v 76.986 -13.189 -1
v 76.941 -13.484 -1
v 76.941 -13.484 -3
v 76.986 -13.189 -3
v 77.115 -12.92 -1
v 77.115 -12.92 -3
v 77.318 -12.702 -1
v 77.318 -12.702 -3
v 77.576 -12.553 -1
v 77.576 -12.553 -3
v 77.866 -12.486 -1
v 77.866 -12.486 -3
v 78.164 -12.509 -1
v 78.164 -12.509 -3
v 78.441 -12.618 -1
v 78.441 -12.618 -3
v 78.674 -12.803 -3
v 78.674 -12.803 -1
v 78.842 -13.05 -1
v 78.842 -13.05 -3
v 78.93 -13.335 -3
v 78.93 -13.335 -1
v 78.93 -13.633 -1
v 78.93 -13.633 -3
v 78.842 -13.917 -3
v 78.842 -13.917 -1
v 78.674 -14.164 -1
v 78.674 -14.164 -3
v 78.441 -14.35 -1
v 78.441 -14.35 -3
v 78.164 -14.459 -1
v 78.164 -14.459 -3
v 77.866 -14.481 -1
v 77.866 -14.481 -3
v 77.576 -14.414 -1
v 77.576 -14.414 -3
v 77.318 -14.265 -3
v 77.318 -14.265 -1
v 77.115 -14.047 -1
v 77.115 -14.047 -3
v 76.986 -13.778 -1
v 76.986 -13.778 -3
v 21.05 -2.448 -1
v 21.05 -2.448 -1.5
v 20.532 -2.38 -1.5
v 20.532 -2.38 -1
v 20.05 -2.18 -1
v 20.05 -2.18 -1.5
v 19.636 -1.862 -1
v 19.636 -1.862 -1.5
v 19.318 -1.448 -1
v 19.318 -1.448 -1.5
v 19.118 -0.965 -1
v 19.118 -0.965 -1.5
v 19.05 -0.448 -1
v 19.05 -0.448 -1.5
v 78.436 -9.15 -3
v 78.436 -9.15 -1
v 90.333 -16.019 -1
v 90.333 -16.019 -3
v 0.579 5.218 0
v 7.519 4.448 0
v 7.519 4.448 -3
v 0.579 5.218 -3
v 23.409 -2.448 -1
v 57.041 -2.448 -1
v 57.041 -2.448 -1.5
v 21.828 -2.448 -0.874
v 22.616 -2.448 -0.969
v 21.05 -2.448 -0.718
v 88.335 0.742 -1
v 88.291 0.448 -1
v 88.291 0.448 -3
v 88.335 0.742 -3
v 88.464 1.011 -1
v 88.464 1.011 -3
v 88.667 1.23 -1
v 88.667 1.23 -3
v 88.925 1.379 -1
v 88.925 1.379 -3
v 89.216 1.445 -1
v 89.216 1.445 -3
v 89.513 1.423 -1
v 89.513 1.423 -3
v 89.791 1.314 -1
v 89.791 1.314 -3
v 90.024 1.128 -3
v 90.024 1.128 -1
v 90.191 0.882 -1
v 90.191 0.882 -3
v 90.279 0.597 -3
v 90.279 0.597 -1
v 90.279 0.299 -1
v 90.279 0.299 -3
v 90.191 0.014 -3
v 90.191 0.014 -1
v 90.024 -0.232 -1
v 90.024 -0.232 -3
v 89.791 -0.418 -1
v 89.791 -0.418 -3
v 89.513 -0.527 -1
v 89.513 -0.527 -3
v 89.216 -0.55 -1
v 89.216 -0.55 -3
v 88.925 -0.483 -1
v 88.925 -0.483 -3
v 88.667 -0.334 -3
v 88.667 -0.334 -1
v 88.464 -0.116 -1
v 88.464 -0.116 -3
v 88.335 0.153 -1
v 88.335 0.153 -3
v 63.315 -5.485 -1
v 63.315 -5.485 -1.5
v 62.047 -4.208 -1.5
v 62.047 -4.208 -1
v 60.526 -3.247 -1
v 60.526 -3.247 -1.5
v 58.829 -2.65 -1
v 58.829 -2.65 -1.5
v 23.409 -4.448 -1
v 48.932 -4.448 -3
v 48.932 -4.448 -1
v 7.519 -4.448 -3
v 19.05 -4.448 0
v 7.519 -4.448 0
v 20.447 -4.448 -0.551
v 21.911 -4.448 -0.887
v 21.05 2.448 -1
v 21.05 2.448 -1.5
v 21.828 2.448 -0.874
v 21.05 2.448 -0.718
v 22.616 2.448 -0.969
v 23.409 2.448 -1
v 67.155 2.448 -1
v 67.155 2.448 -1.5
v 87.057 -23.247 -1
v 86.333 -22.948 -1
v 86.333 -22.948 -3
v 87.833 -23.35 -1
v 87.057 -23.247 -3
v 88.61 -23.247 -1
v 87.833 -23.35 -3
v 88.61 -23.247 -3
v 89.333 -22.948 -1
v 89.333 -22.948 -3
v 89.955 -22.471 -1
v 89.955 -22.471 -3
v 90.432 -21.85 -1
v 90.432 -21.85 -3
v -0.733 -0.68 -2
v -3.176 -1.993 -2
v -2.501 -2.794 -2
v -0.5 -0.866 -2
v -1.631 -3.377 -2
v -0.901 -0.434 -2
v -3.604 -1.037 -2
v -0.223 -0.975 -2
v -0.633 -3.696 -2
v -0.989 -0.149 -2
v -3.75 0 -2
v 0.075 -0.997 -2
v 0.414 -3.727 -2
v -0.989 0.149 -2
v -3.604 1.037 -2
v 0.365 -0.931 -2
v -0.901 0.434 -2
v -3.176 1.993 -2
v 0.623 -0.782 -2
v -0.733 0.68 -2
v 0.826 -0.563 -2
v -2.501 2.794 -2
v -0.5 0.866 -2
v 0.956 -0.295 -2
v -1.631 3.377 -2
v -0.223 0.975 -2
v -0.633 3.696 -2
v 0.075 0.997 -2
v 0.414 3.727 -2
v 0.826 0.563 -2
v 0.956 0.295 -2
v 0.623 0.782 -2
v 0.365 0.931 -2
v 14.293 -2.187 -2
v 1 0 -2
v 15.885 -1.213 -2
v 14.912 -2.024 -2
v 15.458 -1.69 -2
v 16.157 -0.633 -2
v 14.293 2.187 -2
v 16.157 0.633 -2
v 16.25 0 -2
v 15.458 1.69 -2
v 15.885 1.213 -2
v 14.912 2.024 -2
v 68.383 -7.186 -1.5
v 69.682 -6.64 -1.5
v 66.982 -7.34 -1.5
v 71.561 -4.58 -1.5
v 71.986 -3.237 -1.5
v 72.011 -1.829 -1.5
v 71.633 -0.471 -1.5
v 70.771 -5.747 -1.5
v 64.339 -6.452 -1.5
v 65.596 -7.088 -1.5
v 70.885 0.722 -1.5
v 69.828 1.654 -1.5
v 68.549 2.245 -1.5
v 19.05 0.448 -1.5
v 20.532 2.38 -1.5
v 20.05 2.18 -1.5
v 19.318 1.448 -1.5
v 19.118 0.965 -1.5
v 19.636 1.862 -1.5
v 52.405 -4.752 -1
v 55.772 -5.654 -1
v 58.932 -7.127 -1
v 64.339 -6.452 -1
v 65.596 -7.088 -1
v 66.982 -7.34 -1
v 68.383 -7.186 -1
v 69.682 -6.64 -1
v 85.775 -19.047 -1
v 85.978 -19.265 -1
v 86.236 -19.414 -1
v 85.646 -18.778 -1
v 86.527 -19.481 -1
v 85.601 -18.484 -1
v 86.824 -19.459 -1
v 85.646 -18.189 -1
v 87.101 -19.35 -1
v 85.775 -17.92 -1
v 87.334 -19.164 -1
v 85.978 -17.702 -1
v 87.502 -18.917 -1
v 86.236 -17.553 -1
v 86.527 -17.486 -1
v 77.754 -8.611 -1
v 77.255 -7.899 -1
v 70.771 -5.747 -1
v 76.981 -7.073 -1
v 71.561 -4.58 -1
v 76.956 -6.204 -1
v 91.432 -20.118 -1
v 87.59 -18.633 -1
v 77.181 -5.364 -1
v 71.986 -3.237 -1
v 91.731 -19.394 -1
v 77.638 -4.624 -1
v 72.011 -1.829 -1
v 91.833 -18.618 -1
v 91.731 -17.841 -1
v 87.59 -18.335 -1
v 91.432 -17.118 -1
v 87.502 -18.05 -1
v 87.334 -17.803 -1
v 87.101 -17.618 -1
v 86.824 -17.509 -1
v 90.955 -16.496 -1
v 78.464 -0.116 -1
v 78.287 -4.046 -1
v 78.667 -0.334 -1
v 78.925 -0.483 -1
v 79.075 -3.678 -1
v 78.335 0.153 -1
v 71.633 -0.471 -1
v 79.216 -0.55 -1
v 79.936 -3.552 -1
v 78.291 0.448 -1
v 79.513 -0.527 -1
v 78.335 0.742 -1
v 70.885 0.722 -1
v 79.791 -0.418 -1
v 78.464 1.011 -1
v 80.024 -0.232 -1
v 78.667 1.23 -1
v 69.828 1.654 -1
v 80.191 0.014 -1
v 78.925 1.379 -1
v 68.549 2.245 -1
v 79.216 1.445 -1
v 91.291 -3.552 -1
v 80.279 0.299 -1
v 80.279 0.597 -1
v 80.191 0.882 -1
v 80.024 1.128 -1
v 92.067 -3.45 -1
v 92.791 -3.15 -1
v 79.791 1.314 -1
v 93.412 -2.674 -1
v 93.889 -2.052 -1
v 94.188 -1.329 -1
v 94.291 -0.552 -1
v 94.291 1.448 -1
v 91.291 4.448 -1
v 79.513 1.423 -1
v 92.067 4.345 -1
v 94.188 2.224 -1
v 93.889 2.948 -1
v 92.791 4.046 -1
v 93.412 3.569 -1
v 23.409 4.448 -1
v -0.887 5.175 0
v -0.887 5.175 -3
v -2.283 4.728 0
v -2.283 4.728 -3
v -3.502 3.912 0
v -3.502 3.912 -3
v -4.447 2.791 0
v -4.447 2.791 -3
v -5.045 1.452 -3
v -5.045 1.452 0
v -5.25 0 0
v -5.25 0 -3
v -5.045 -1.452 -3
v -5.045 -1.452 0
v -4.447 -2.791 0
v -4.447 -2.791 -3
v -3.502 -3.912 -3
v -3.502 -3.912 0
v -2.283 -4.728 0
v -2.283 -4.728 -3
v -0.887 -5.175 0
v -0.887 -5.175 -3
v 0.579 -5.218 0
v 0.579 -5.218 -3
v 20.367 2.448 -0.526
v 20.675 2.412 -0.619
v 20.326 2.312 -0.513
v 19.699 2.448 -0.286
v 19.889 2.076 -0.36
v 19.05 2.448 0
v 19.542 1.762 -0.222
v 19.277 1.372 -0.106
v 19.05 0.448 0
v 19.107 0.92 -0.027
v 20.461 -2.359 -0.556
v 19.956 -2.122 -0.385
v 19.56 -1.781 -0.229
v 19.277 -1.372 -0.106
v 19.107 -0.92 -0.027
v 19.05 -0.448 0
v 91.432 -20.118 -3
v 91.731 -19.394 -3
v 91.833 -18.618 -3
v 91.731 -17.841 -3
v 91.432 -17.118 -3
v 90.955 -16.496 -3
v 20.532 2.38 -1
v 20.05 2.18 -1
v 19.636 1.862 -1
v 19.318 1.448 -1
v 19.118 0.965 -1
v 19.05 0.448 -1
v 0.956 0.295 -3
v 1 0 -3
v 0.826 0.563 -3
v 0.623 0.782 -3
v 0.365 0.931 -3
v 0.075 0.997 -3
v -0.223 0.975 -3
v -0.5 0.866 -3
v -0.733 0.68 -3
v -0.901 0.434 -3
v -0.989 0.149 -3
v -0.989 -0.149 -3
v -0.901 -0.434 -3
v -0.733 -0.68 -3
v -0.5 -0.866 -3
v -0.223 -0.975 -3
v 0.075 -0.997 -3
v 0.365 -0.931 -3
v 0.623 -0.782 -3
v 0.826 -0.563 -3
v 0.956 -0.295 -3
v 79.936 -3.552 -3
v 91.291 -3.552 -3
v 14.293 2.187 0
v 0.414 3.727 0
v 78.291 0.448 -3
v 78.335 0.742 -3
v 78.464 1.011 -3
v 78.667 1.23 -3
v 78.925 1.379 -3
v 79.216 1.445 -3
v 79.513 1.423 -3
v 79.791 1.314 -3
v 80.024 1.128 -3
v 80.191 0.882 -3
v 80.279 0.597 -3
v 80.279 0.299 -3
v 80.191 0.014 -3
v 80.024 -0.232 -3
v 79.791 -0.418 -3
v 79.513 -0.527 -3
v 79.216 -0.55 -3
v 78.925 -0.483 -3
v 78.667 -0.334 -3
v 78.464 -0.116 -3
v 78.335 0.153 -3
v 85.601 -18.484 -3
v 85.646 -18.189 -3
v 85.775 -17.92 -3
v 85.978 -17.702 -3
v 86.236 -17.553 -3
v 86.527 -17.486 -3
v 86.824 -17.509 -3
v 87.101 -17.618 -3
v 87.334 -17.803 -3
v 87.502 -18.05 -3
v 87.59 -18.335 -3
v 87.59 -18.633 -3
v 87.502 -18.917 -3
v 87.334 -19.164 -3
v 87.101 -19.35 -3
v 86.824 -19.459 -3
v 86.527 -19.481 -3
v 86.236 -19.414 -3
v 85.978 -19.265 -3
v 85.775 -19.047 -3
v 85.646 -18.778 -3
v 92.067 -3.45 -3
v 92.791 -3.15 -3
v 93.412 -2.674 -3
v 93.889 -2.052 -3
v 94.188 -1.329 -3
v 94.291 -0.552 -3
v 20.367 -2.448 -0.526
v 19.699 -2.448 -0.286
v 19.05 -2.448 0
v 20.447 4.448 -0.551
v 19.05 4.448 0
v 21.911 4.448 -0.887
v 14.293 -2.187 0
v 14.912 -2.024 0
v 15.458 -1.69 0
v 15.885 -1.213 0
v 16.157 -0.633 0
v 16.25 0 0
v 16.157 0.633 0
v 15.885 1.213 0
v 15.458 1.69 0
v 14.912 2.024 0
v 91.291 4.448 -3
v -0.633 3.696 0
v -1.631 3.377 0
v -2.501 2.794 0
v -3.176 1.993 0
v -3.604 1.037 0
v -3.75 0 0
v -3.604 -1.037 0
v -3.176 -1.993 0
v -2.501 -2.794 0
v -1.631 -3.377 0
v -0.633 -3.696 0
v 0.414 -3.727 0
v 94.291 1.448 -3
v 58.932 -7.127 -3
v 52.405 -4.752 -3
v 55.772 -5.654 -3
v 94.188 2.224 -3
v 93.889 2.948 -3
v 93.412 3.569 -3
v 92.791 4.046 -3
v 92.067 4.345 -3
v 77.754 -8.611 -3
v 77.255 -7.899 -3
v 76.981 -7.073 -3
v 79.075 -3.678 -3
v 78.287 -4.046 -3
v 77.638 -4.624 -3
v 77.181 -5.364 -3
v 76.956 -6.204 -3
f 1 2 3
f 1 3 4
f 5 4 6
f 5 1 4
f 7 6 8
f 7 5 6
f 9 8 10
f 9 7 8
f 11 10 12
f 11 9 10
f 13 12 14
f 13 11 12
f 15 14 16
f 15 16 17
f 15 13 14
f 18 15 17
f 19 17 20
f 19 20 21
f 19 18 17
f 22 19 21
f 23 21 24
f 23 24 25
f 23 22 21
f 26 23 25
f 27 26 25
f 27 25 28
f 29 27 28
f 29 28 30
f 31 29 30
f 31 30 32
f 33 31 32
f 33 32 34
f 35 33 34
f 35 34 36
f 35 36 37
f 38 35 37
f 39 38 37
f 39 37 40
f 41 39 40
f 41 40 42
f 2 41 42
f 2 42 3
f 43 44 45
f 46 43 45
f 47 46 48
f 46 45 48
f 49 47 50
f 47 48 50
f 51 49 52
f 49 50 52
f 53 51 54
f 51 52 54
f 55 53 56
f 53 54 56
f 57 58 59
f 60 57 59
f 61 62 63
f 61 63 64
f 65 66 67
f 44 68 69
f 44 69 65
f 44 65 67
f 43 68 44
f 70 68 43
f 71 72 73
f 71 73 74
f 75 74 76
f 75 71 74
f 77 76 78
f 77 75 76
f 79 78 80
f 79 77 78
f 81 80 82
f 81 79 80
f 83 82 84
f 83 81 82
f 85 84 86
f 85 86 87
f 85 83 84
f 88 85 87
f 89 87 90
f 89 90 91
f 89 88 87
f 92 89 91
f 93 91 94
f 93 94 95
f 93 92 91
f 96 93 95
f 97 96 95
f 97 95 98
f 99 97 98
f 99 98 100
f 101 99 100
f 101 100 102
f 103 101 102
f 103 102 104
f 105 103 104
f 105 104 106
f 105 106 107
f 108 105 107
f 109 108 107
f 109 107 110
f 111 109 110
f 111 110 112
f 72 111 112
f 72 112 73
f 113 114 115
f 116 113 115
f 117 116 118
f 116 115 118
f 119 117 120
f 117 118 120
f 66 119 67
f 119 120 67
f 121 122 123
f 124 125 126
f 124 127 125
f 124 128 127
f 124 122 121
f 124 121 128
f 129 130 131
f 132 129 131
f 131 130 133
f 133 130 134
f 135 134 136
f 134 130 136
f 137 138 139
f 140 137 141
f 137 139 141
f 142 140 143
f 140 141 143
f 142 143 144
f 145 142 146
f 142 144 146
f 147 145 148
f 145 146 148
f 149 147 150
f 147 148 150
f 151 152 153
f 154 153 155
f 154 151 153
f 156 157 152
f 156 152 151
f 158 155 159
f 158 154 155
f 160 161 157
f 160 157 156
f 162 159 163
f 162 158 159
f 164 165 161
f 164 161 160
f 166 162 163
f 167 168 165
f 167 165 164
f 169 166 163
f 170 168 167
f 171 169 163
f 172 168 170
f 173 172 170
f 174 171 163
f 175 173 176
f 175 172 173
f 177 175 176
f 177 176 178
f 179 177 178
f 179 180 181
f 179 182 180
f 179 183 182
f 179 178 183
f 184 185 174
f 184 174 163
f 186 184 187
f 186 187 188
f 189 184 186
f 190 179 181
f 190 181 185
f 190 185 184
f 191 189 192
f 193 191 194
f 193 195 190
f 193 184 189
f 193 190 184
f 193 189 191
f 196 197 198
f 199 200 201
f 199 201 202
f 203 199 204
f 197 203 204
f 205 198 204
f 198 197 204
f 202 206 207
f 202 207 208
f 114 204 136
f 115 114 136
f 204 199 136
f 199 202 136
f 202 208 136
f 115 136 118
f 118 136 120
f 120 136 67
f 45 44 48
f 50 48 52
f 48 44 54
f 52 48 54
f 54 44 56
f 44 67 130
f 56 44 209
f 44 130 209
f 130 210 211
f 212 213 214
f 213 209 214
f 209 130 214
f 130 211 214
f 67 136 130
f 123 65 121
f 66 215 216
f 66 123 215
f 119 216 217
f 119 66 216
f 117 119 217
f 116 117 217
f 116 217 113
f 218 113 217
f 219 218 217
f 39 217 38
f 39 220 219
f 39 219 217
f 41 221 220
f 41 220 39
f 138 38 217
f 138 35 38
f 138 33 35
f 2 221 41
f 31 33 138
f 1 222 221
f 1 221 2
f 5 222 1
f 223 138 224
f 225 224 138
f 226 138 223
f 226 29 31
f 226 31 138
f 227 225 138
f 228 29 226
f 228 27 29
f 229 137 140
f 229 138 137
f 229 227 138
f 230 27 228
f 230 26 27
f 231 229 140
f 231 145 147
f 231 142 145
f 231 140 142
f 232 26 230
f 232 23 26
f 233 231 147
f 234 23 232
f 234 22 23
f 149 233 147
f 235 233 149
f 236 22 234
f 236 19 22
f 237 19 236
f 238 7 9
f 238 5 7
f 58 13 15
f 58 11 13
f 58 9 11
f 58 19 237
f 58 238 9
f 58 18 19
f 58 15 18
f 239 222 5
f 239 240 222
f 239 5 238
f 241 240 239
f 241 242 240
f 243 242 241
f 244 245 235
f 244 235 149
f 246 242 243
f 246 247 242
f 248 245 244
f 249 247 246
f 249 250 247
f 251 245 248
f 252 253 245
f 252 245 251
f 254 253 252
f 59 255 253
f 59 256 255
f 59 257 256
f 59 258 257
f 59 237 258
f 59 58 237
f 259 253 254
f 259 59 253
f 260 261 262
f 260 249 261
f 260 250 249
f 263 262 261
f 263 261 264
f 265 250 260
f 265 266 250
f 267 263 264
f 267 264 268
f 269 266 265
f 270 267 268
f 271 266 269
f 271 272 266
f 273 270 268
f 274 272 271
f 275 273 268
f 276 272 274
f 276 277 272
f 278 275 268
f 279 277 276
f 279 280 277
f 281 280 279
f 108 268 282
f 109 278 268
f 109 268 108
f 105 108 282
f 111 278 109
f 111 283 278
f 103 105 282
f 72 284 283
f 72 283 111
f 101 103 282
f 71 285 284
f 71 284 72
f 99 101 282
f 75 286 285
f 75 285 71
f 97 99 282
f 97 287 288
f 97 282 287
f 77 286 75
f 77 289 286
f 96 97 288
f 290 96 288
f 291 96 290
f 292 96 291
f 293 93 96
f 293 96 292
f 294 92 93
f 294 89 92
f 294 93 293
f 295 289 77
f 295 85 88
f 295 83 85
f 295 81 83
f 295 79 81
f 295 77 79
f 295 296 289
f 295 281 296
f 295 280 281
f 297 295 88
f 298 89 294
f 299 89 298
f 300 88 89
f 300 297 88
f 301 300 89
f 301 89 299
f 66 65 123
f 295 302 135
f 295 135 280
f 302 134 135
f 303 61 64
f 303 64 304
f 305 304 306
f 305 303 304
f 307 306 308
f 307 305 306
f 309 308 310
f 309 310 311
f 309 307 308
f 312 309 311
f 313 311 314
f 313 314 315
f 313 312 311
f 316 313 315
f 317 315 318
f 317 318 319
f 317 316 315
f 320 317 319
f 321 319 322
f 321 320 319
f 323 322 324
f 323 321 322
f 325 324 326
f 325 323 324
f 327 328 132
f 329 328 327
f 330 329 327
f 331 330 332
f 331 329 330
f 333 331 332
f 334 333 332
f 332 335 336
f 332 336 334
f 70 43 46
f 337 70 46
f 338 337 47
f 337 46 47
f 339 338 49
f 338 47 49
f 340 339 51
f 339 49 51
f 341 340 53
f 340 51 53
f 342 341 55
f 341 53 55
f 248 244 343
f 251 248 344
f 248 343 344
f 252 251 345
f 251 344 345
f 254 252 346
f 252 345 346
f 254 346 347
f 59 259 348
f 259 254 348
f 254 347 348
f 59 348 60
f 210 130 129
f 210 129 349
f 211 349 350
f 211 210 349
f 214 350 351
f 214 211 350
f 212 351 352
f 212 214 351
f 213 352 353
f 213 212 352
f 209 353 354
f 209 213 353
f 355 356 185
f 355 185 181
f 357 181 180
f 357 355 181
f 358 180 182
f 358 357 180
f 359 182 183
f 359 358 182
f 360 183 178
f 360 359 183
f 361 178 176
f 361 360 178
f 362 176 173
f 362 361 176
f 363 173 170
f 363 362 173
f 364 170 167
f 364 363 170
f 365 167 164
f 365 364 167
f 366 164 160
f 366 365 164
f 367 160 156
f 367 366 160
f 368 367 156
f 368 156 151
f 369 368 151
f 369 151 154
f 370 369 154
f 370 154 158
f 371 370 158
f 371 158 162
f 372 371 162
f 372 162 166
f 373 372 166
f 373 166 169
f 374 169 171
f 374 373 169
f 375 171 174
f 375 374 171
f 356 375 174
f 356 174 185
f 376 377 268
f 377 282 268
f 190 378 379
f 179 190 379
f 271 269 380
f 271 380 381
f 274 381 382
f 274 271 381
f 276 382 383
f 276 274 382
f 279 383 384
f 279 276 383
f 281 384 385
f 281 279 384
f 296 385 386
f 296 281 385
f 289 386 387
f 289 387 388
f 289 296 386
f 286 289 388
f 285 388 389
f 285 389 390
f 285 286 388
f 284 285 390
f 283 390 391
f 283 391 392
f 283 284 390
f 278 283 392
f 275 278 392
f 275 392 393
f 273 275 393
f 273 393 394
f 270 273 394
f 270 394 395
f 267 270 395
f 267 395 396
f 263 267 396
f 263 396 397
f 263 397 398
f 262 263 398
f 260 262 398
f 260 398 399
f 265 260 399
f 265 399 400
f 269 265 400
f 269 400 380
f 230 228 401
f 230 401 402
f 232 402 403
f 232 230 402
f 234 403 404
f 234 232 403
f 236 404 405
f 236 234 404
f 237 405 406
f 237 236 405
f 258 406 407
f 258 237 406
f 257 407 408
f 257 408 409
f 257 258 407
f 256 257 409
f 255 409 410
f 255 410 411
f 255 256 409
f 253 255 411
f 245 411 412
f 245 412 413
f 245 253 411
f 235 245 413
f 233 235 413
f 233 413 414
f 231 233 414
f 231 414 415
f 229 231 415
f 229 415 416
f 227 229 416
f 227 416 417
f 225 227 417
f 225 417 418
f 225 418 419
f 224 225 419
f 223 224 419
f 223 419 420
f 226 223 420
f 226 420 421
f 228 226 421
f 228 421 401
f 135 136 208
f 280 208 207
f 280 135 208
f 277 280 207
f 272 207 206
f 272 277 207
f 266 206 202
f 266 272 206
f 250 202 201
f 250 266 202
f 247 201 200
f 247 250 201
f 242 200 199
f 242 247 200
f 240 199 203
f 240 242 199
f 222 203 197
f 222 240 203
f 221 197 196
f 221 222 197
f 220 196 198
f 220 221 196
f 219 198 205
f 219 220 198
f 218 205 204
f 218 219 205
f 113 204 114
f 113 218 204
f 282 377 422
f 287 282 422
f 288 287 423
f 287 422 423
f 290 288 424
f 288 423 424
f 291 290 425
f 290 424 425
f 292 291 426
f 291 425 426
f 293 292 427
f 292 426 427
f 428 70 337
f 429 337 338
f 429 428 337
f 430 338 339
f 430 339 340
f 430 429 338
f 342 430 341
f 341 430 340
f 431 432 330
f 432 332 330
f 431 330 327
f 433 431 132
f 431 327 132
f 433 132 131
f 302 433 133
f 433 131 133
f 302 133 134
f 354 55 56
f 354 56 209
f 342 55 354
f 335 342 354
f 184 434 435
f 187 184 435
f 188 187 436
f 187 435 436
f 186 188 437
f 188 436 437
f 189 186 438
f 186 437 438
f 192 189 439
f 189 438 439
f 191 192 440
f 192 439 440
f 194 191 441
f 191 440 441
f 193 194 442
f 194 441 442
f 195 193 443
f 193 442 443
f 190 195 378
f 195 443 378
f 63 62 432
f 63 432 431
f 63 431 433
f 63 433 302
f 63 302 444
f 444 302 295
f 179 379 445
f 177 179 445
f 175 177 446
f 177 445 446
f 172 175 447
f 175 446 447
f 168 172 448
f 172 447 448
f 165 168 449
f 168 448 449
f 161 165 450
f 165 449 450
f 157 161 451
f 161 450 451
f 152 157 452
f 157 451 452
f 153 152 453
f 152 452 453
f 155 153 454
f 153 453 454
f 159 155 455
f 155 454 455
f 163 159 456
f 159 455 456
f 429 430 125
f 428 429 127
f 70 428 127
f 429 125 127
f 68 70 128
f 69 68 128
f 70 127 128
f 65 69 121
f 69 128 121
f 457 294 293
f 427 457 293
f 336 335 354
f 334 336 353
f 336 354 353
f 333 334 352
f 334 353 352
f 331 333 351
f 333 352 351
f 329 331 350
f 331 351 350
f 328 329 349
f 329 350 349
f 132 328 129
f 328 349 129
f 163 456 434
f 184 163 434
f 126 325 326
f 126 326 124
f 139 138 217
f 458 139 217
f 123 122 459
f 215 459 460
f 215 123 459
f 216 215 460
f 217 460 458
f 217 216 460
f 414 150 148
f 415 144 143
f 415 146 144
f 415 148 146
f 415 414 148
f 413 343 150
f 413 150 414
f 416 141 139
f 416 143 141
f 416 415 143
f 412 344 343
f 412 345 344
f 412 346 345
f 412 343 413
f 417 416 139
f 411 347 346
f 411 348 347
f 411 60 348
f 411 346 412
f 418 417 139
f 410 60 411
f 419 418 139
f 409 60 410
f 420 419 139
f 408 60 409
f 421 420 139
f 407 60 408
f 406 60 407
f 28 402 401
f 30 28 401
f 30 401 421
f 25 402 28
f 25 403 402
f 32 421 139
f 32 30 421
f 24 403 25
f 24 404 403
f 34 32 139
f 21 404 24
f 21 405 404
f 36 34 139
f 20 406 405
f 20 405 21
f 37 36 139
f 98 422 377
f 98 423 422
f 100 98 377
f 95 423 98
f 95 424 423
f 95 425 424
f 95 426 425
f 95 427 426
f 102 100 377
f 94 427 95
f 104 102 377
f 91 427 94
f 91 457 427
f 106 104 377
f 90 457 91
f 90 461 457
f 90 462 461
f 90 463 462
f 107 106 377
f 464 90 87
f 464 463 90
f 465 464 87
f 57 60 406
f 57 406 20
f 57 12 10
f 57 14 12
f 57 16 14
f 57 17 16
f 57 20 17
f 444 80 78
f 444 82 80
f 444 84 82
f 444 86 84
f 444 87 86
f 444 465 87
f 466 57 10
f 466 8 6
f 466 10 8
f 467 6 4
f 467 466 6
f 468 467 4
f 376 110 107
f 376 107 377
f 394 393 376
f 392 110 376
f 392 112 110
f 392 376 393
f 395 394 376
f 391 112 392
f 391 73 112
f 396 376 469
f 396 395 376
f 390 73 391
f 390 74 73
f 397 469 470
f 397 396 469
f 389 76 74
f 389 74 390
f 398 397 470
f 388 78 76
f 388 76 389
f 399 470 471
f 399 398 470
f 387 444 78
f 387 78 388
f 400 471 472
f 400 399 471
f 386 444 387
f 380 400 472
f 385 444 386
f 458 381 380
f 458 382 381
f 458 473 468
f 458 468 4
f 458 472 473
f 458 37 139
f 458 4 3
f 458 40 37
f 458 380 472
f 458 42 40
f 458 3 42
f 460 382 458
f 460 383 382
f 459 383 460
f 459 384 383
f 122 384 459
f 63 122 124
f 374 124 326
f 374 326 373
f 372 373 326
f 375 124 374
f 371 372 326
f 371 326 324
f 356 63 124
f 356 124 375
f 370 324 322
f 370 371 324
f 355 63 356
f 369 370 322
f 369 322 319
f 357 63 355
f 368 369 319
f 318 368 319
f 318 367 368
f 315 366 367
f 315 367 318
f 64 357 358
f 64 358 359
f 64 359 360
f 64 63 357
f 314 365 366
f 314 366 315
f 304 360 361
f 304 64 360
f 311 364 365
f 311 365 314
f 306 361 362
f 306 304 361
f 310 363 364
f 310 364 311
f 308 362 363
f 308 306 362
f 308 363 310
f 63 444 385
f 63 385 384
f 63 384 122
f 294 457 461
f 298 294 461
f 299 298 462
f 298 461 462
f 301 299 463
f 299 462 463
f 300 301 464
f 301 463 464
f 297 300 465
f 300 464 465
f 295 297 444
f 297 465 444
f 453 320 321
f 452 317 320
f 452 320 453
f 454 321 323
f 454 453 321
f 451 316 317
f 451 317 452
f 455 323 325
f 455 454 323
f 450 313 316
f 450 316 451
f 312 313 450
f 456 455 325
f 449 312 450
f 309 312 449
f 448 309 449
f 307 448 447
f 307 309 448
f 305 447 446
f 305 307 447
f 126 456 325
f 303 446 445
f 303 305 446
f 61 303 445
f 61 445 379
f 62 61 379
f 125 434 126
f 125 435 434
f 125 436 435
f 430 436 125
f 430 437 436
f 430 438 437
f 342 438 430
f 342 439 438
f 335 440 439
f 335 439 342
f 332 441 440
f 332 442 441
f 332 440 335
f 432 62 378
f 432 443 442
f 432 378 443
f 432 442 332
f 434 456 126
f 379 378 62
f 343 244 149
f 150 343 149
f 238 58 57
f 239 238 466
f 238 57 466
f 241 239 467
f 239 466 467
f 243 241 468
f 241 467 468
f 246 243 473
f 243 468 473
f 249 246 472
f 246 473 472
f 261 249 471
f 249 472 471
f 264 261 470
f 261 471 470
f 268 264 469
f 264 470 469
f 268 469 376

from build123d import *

# Parameters (mm, degrees)
BOSS_EXTRUDE1_DEPTH      = 2
BOSS_EXTRUDE2_DEPTH      = 1
SKETCH3_R                = 1
CUT_EXTRUDE1_DEPTH       = 1
BOSS_EXTRUDE3_DEPTH      = 2
BOSS_EXTRUDE3_DEPTH_BACK = 1
BOSS_EXTRUDE4_START      = -3
BOSS_EXTRUDE4_OUTLINE_R  = 1
BOSS_EXTRUDE4_DEPTH      = 3
SKETCH6_R                = 3.500627768
BOSS_EXTRUDE5_DEPTH      = 3
BOSS_EXTRUDE6_DEPTH      = 3
CUT_EXTRUDE2_DEPTH       = 15
FILLET1_R                = 20
FILLET2_R                = 3
FILLET3_R                = 3
SKETCH9_R                = 1
CUT_EXTRUDE3_DEPTH       = 15
CUT_EXTRUDE4_DEPTH       = 1.5
FILLET4_R                = 8
FILLET5_R                = 2
SKETCH11_W               = 110.258684369
SKETCH11_H               = 6.064888907
CUT_EXTRUDE5_DEPTH       = 38
SKETCH12_R               = 18.613151801
CUT_EXTRUDE6_DEPTH       = 29
SKETCH13_W               = 77.706478895
SKETCH13_H               = 41.021519778
CUT_EXTRUDE7_DEPTH       = 1
FILLET6_START            = -4.447684996
FILLET6_DEPTH            = 2
FILLET6_START_2          = 2.447684996
FILLET6_2_DEPTH          = 2
FILLET6_START_3          = -1
FILLET6_3_DEPTH          = 1
FILLET6_START_4          = -2.447684996
FILLET6_4_DEPTH          = 4.895369992


with BuildPart() as part:
    # Sketch1 → Boss-Extrude1 (new body)
    with BuildSketch(Plane.XY):
        with BuildLine():
            Line((14.458185053, 3.677415528), (0.579181495, 5.217954465))
            ThreePointArc((0.579181495, 5.217954465), (-5.25, 0), (0.579181495, -5.217954465))
            Line((0.579181495, -5.217954465), (14.458185053, -3.677415528))
            ThreePointArc((14.458185053, -3.677415528), (17.75, 0), (14.458185053, 3.677415528))
        make_face()
        with BuildLine():
            Line((14.292704626, 2.186571395), (0.413701068, 3.727110332))
            ThreePointArc((0.413701068, 3.727110332), (-3.75, 0), (0.413701068, -3.727110332))
            Line((0.413701068, -3.727110332), (14.292704626, -2.186571395))
            ThreePointArc((14.292704626, -2.186571395), (16.25, 0), (14.292704626, 2.186571395))
        make_face(mode=Mode.SUBTRACT)
    extrude(amount=BOSS_EXTRUDE1_DEPTH)

    # Sketch2 → Boss-Extrude2 (add)
    with BuildSketch(Plane.XY.offset(2)):
        with BuildLine():
            Line((14.458185053, 3.677415528), (0.579181495, 5.217954465))
            ThreePointArc((0.579181495, 5.217954465), (-5.25, 0), (0.579181495, -5.217954465))
            Line((0.579181495, -5.217954465), (14.458185053, -3.677415528))
            ThreePointArc((14.458185053, -3.677415528), (17.75, 0), (14.458185053, 3.677415528))
        make_face()
    extrude(amount=BOSS_EXTRUDE2_DEPTH)

    # Sketch3 → Cut-Extrude1 (cut)
    with BuildSketch(Plane.XY.offset(3)):
        Circle(SKETCH3_R)
    extrude(amount=-CUT_EXTRUDE1_DEPTH, mode=Mode.SUBTRACT)

    # Sketch4 → Boss-Extrude3 (add, two sides: drawn at the far end of the back side and taken through both)
    with BuildSketch(Plane(origin=(0, 0, 2), x_dir=(-1, 0, 0), z_dir=(0, 0, -1)).offset(-BOSS_EXTRUDE3_DEPTH_BACK)):
        with BuildLine():
            Line((-15.26072202, 2.426182253), (-7.518683274, 4.447684996))
            Line((-7.518683274, 4.447684996), (-42.518683274, 4.447684996))
            ThreePointArc((-42.518683274, 4.447684996), (-39.373695053, 3.144988221), (-38.070998278, 0))
            ThreePointArc((-38.070998278, 0), (-39.373695053, -3.144988221), (-42.518683274, -4.447684996))
            Line((-42.518683274, -4.447684996), (-7.518683274, -4.447684996))
            Line((-7.518683274, -4.447684996), (-13.862339481, -2.595687971))
            Line((-13.862339481, -2.595687971), (-16.213670101, -1.84565397))
            Line((-16.213670101, -1.84565397), (-17.166618181, 0))
            Line((-17.166618181, 0), (-15.26072202, 2.426182253))
        make_face()
        with BuildLine():
            ThreePointArc((-38.070998278, 0), (-39.373695053, 3.144988221), (-42.518683274, 4.447684996))
            Line((-42.518683274, 4.447684996), (-42.518683274, 2))
            ThreePointArc((-42.518683274, 2), (-41.104469712, 1.414213562), (-40.518683274, 0))
            ThreePointArc((-40.518683274, 0), (-41.104469712, -1.414213562), (-42.518683274, -2))
            Line((-42.518683274, -2), (-42.518683274, -4.447684996))
            ThreePointArc((-42.518683274, -4.447684996), (-39.373695053, -3.144988221), (-38.070998278, 0))
        make_face()
        with BuildLine():
            Line((-42.518683274, 2), (-42.518683274, 4.447684996))
            ThreePointArc((-42.518683274, 4.447684996), (-46.96636827, 0), (-42.518683274, -4.447684996))
            Line((-42.518683274, -4.447684996), (-42.518683274, -2))
            ThreePointArc((-42.518683274, -2), (-44.518683274, 0), (-42.518683274, 2))
        make_face()
    extrude(amount=BOSS_EXTRUDE3_DEPTH + BOSS_EXTRUDE3_DEPTH_BACK)

    # Boss-Extrude4: read off the stored shape, not the designer's step
    # Boss-Extrude4 outline → Boss-Extrude4 (add)
    with BuildSketch(Plane(origin=(0, 0, 0), x_dir=(-1, 0, 0), z_dir=(0, 0, -1)).offset(BOSS_EXTRUDE4_START)):
        with BuildLine():
            ThreePointArc((-42.518683274, -4.447684996), (-46.96636827, 0), (-42.518683274, 4.447684996))
            Line((-42.518683274, 4.447684996), (-54.290526798, 4.447684996))
            ThreePointArc((-54.290526798, 4.447684996), (-59.289068337, 5.305033813), (-63.716210719, 7.779073998))
            ThreePointArc((-63.716210719, 7.779073998), (-80, 0), (-63.716210719, -7.779073998))
            ThreePointArc((-63.716210719, -7.779073998), (-59.289068337, -5.305033813), (-54.290526798, -4.447684996))
            Line((-54.290526798, -4.447684996), (-42.518683274, -4.447684996))
        make_face()
        with Locations((-68.205771366, -4.5)):
            Circle(BOSS_EXTRUDE4_OUTLINE_R, mode=Mode.SUBTRACT)
        with Locations((-76, 0)):
            Circle(BOSS_EXTRUDE4_OUTLINE_R, mode=Mode.SUBTRACT)
        with Locations((-68.205771366, 4.5)):
            Circle(BOSS_EXTRUDE4_OUTLINE_R, mode=Mode.SUBTRACT)
    extrude(amount=BOSS_EXTRUDE4_DEPTH)

    # Sketch6 → Boss-Extrude5 (add)
    with BuildSketch(Plane(origin=(0, 0, 0), x_dir=(-1, 0, 0), z_dir=(0, 0, -1))):
        with Locations((-42.518683274, 0)):
            Circle(SKETCH6_R)
    extrude(amount=-BOSS_EXTRUDE5_DEPTH)

    # Sketch7 → Boss-Extrude6 (add)
    with BuildSketch(Plane(origin=(0, 0, 0), x_dir=(-1, 0, 0), z_dir=(0, 0, -1))):
        Polygon((-54.290526798, 4.447684996), (-94.290526798, 4.447684996), (-94.290526798, -3.552315004), (-68.73970048, -3.552315004), (-92.931542949, -17.519481766), (-88.931542949, -24.447684996), (-54.290526798, -4.447684996), align=None)
    extrude(amount=-BOSS_EXTRUDE6_DEPTH)

    # Sketch8 → Cut-Extrude2 (cut)
    with BuildSketch(Plane(origin=(0, 0, 0), x_dir=(-1, 0, 0), z_dir=(0, 0, -1))):
        Polygon((-94.290526798, 4.447684996), (-45.837456427, 4.447684996), (-68.326886593, 15.265325323), align=None)
        Polygon((-94.290526798, -3.552315004), (-68.73970048, -3.552315004), (-92.931542949, -17.519481766), align=None)
    extrude(amount=-CUT_EXTRUDE2_DEPTH, mode=Mode.SUBTRACT)

    # Fillet1
    fillet1_edges = [part.edges().sort_by_distance(p)[0] for p in [
        (54.290526798, -4.447684996, 1.5),
    ]]
    fillet(fillet1_edges, radius=FILLET1_R)

    # Fillet2
    fillet2_edges = [part.edges().sort_by_distance(p)[0] for p in [
        (94.290526798, 4.447684996, 1.5),
        (94.290526798, -3.552315004, 1.5),
        (92.931542949, -17.519481766, 1.5),
        (88.931542949, -24.447684996, 1.5),
    ]]
    fillet(fillet2_edges, radius=FILLET2_R)

    # Fillet3
    fillet3_edges = [part.edges().sort_by_distance(p)[0] for p in [
        (68.73970048, -3.552315004, 1.5),
    ]]
    fillet(fillet3_edges, radius=FILLET3_R)

    # Sketch9 → Cut-Extrude3 (cut)
    with BuildSketch(Plane(origin=(0, 0, 0), x_dir=(-1, 0, 0), z_dir=(0, 0, -1))):
        with Locations((-89.290526798, 0.447684996)):
            Circle(SKETCH9_R)
        with Locations((-79.290526798, 0.447684996)):
            Circle(SKETCH9_R)
        with Locations((-77.941161892, -13.483583381)):
            Circle(SKETCH9_R)
        with Locations((-86.60141593, -18.483583381)):
            Circle(SKETCH9_R)
    extrude(amount=-CUT_EXTRUDE3_DEPTH, mode=Mode.SUBTRACT)

    # Sketch10 → Cut-Extrude4 (cut)
    with BuildSketch(Plane(origin=(0, 0, 0), x_dir=(-1, 0, 0), z_dir=(0, 0, -1))):
        with BuildLine():
            Line((-19.05, 2.447684996), (-67.154630008, 2.447684996))
            ThreePointArc((-67.154630008, 2.447684996), (-70.616179326, -5.909234314), (-62.259260015, -2.447684996))
            Line((-62.259260015, -2.447684996), (-19.05, -2.447684996))
            Line((-19.05, -2.447684996), (-19.05, 2.447684996))
        make_face()
    extrude(amount=-CUT_EXTRUDE4_DEPTH, mode=Mode.SUBTRACT)

    # Fillet4
    fillet4_edges = [part.edges().sort_by_distance(p)[0] for p in [
        (62.259260015, -2.447684996, 0.75),
    ]]
    fillet(fillet4_edges, radius=FILLET4_R)

    # Fillet5
    fillet5_edges = [part.edges().sort_by_distance(p)[0] for p in [
        (19.05, 2.447684996, 0.75),
        (19.05, -2.447684996, 0.75),
    ]]
    fillet(fillet5_edges, radius=FILLET5_R)

    # Mirror1: part across plane


with BuildPart() as part_1:
    add(part.part)
    add(part.part.mirror(Plane(origin=(14.05, 0, 0), x_dir=(1, 0, 0), z_dir=(0, 0, 1))))

    # Sketch11 → Cut-Extrude5 (cut)
    with BuildSketch(Plane(origin=(0, 4.447684996, 0), x_dir=(1, 0, 0), z_dir=(0, 1, 0))):
        with Locations((47.771534573, -3.032444454)):
            Rectangle(SKETCH11_W, SKETCH11_H)
    extrude(amount=-CUT_EXTRUDE5_DEPTH, mode=Mode.SUBTRACT)

    # Sketch12 → Cut-Extrude6 (cut)
    with BuildSketch(Plane.XY):
        with Locations((7.534351793, 3.599902348)):
            Circle(SKETCH12_R)
    extrude(amount=CUT_EXTRUDE6_DEPTH, mode=Mode.SUBTRACT)

    # Sketch13 → Cut-Extrude7 (cut)
    with BuildSketch(Plane.XY):
        with Locations((57.903239447, -8.718962854)):
            Rectangle(SKETCH13_W, SKETCH13_H)
    extrude(amount=-CUT_EXTRUDE7_DEPTH, mode=Mode.SUBTRACT)

    # Fillet6: read off the stored shape, not the designer's step
    # Fillet6 outline → Fillet6 (add)
    with BuildSketch(Plane(origin=(0, 0, 0), x_dir=(1, 0, 0), z_dir=(0, 1, 0)).offset(FILLET6_START)):
        with BuildLine():
            Line((19.05, 1), (19.049997006, -1.45e-06))
            ThreePointArc((19.049997006, -1.45e-06), (21.172829345, 0.746793973), (23.408898944, 1))
            Line((23.408898944, 1), (19.05, 1))
        make_face()
    extrude(amount=FILLET6_DEPTH)

    # Fillet6 2 outline → Fillet6 2 (add)
    with BuildSketch(Plane(origin=(0, 0, 0), x_dir=(1, 0, 0), z_dir=(0, 1, 0)).offset(FILLET6_START_2)):
        with BuildLine():
            Line((19.05, 1), (19.049997006, -1.45e-06))
            ThreePointArc((19.049997006, -1.45e-06), (21.172829345, 0.746793973), (23.408898944, 1))
            Line((23.408898944, 1), (19.05, 1))
        make_face()
    extrude(amount=FILLET6_2_DEPTH)

    # Fillet6 3 outline → Fillet6 3 (add)
    with BuildSketch(Plane.XY.offset(FILLET6_START_3)):
        with BuildLine():
            Line((19.05, 2.447684996), (19.05, 0.447684996))
            ThreePointArc((19.05, 0.447684996), (19.635786438, 1.861898559), (21.05, 2.447684996))
            Line((21.05, 2.447684996), (19.05, 2.447684996))
        make_face()
        with BuildLine():
            ThreePointArc((21.05, -2.447684996), (19.635786438, -1.861898559), (19.05, -0.447684996))
            Line((19.05, -0.447684996), (19.05, -2.447684996))
            Line((19.05, -2.447684996), (21.05, -2.447684996))
        make_face()
    extrude(amount=FILLET6_3_DEPTH)

    # Fillet6 4 outline → Fillet6 4 (cut)
    with BuildSketch(Plane(origin=(0, 0, 0), x_dir=(1, 0, 0), z_dir=(0, 1, 0)).offset(FILLET6_START_4)):
        with BuildLine():
            ThreePointArc((23, 0.991636585), (20.973982557, 0.699029961), (19.049997006, -1.45e-06))
            Line((19.049997006, -1.45e-06), (18, -0.508538641))
            Line((18, -0.508538641), (18, -1))
            Line((18, -1), (23, -1))
            Line((23, -1), (23, 0.991636585))
        make_face()
    extrude(amount=FILLET6_4_DEPTH, mode=Mode.SUBTRACT)


solid = part_1.part
